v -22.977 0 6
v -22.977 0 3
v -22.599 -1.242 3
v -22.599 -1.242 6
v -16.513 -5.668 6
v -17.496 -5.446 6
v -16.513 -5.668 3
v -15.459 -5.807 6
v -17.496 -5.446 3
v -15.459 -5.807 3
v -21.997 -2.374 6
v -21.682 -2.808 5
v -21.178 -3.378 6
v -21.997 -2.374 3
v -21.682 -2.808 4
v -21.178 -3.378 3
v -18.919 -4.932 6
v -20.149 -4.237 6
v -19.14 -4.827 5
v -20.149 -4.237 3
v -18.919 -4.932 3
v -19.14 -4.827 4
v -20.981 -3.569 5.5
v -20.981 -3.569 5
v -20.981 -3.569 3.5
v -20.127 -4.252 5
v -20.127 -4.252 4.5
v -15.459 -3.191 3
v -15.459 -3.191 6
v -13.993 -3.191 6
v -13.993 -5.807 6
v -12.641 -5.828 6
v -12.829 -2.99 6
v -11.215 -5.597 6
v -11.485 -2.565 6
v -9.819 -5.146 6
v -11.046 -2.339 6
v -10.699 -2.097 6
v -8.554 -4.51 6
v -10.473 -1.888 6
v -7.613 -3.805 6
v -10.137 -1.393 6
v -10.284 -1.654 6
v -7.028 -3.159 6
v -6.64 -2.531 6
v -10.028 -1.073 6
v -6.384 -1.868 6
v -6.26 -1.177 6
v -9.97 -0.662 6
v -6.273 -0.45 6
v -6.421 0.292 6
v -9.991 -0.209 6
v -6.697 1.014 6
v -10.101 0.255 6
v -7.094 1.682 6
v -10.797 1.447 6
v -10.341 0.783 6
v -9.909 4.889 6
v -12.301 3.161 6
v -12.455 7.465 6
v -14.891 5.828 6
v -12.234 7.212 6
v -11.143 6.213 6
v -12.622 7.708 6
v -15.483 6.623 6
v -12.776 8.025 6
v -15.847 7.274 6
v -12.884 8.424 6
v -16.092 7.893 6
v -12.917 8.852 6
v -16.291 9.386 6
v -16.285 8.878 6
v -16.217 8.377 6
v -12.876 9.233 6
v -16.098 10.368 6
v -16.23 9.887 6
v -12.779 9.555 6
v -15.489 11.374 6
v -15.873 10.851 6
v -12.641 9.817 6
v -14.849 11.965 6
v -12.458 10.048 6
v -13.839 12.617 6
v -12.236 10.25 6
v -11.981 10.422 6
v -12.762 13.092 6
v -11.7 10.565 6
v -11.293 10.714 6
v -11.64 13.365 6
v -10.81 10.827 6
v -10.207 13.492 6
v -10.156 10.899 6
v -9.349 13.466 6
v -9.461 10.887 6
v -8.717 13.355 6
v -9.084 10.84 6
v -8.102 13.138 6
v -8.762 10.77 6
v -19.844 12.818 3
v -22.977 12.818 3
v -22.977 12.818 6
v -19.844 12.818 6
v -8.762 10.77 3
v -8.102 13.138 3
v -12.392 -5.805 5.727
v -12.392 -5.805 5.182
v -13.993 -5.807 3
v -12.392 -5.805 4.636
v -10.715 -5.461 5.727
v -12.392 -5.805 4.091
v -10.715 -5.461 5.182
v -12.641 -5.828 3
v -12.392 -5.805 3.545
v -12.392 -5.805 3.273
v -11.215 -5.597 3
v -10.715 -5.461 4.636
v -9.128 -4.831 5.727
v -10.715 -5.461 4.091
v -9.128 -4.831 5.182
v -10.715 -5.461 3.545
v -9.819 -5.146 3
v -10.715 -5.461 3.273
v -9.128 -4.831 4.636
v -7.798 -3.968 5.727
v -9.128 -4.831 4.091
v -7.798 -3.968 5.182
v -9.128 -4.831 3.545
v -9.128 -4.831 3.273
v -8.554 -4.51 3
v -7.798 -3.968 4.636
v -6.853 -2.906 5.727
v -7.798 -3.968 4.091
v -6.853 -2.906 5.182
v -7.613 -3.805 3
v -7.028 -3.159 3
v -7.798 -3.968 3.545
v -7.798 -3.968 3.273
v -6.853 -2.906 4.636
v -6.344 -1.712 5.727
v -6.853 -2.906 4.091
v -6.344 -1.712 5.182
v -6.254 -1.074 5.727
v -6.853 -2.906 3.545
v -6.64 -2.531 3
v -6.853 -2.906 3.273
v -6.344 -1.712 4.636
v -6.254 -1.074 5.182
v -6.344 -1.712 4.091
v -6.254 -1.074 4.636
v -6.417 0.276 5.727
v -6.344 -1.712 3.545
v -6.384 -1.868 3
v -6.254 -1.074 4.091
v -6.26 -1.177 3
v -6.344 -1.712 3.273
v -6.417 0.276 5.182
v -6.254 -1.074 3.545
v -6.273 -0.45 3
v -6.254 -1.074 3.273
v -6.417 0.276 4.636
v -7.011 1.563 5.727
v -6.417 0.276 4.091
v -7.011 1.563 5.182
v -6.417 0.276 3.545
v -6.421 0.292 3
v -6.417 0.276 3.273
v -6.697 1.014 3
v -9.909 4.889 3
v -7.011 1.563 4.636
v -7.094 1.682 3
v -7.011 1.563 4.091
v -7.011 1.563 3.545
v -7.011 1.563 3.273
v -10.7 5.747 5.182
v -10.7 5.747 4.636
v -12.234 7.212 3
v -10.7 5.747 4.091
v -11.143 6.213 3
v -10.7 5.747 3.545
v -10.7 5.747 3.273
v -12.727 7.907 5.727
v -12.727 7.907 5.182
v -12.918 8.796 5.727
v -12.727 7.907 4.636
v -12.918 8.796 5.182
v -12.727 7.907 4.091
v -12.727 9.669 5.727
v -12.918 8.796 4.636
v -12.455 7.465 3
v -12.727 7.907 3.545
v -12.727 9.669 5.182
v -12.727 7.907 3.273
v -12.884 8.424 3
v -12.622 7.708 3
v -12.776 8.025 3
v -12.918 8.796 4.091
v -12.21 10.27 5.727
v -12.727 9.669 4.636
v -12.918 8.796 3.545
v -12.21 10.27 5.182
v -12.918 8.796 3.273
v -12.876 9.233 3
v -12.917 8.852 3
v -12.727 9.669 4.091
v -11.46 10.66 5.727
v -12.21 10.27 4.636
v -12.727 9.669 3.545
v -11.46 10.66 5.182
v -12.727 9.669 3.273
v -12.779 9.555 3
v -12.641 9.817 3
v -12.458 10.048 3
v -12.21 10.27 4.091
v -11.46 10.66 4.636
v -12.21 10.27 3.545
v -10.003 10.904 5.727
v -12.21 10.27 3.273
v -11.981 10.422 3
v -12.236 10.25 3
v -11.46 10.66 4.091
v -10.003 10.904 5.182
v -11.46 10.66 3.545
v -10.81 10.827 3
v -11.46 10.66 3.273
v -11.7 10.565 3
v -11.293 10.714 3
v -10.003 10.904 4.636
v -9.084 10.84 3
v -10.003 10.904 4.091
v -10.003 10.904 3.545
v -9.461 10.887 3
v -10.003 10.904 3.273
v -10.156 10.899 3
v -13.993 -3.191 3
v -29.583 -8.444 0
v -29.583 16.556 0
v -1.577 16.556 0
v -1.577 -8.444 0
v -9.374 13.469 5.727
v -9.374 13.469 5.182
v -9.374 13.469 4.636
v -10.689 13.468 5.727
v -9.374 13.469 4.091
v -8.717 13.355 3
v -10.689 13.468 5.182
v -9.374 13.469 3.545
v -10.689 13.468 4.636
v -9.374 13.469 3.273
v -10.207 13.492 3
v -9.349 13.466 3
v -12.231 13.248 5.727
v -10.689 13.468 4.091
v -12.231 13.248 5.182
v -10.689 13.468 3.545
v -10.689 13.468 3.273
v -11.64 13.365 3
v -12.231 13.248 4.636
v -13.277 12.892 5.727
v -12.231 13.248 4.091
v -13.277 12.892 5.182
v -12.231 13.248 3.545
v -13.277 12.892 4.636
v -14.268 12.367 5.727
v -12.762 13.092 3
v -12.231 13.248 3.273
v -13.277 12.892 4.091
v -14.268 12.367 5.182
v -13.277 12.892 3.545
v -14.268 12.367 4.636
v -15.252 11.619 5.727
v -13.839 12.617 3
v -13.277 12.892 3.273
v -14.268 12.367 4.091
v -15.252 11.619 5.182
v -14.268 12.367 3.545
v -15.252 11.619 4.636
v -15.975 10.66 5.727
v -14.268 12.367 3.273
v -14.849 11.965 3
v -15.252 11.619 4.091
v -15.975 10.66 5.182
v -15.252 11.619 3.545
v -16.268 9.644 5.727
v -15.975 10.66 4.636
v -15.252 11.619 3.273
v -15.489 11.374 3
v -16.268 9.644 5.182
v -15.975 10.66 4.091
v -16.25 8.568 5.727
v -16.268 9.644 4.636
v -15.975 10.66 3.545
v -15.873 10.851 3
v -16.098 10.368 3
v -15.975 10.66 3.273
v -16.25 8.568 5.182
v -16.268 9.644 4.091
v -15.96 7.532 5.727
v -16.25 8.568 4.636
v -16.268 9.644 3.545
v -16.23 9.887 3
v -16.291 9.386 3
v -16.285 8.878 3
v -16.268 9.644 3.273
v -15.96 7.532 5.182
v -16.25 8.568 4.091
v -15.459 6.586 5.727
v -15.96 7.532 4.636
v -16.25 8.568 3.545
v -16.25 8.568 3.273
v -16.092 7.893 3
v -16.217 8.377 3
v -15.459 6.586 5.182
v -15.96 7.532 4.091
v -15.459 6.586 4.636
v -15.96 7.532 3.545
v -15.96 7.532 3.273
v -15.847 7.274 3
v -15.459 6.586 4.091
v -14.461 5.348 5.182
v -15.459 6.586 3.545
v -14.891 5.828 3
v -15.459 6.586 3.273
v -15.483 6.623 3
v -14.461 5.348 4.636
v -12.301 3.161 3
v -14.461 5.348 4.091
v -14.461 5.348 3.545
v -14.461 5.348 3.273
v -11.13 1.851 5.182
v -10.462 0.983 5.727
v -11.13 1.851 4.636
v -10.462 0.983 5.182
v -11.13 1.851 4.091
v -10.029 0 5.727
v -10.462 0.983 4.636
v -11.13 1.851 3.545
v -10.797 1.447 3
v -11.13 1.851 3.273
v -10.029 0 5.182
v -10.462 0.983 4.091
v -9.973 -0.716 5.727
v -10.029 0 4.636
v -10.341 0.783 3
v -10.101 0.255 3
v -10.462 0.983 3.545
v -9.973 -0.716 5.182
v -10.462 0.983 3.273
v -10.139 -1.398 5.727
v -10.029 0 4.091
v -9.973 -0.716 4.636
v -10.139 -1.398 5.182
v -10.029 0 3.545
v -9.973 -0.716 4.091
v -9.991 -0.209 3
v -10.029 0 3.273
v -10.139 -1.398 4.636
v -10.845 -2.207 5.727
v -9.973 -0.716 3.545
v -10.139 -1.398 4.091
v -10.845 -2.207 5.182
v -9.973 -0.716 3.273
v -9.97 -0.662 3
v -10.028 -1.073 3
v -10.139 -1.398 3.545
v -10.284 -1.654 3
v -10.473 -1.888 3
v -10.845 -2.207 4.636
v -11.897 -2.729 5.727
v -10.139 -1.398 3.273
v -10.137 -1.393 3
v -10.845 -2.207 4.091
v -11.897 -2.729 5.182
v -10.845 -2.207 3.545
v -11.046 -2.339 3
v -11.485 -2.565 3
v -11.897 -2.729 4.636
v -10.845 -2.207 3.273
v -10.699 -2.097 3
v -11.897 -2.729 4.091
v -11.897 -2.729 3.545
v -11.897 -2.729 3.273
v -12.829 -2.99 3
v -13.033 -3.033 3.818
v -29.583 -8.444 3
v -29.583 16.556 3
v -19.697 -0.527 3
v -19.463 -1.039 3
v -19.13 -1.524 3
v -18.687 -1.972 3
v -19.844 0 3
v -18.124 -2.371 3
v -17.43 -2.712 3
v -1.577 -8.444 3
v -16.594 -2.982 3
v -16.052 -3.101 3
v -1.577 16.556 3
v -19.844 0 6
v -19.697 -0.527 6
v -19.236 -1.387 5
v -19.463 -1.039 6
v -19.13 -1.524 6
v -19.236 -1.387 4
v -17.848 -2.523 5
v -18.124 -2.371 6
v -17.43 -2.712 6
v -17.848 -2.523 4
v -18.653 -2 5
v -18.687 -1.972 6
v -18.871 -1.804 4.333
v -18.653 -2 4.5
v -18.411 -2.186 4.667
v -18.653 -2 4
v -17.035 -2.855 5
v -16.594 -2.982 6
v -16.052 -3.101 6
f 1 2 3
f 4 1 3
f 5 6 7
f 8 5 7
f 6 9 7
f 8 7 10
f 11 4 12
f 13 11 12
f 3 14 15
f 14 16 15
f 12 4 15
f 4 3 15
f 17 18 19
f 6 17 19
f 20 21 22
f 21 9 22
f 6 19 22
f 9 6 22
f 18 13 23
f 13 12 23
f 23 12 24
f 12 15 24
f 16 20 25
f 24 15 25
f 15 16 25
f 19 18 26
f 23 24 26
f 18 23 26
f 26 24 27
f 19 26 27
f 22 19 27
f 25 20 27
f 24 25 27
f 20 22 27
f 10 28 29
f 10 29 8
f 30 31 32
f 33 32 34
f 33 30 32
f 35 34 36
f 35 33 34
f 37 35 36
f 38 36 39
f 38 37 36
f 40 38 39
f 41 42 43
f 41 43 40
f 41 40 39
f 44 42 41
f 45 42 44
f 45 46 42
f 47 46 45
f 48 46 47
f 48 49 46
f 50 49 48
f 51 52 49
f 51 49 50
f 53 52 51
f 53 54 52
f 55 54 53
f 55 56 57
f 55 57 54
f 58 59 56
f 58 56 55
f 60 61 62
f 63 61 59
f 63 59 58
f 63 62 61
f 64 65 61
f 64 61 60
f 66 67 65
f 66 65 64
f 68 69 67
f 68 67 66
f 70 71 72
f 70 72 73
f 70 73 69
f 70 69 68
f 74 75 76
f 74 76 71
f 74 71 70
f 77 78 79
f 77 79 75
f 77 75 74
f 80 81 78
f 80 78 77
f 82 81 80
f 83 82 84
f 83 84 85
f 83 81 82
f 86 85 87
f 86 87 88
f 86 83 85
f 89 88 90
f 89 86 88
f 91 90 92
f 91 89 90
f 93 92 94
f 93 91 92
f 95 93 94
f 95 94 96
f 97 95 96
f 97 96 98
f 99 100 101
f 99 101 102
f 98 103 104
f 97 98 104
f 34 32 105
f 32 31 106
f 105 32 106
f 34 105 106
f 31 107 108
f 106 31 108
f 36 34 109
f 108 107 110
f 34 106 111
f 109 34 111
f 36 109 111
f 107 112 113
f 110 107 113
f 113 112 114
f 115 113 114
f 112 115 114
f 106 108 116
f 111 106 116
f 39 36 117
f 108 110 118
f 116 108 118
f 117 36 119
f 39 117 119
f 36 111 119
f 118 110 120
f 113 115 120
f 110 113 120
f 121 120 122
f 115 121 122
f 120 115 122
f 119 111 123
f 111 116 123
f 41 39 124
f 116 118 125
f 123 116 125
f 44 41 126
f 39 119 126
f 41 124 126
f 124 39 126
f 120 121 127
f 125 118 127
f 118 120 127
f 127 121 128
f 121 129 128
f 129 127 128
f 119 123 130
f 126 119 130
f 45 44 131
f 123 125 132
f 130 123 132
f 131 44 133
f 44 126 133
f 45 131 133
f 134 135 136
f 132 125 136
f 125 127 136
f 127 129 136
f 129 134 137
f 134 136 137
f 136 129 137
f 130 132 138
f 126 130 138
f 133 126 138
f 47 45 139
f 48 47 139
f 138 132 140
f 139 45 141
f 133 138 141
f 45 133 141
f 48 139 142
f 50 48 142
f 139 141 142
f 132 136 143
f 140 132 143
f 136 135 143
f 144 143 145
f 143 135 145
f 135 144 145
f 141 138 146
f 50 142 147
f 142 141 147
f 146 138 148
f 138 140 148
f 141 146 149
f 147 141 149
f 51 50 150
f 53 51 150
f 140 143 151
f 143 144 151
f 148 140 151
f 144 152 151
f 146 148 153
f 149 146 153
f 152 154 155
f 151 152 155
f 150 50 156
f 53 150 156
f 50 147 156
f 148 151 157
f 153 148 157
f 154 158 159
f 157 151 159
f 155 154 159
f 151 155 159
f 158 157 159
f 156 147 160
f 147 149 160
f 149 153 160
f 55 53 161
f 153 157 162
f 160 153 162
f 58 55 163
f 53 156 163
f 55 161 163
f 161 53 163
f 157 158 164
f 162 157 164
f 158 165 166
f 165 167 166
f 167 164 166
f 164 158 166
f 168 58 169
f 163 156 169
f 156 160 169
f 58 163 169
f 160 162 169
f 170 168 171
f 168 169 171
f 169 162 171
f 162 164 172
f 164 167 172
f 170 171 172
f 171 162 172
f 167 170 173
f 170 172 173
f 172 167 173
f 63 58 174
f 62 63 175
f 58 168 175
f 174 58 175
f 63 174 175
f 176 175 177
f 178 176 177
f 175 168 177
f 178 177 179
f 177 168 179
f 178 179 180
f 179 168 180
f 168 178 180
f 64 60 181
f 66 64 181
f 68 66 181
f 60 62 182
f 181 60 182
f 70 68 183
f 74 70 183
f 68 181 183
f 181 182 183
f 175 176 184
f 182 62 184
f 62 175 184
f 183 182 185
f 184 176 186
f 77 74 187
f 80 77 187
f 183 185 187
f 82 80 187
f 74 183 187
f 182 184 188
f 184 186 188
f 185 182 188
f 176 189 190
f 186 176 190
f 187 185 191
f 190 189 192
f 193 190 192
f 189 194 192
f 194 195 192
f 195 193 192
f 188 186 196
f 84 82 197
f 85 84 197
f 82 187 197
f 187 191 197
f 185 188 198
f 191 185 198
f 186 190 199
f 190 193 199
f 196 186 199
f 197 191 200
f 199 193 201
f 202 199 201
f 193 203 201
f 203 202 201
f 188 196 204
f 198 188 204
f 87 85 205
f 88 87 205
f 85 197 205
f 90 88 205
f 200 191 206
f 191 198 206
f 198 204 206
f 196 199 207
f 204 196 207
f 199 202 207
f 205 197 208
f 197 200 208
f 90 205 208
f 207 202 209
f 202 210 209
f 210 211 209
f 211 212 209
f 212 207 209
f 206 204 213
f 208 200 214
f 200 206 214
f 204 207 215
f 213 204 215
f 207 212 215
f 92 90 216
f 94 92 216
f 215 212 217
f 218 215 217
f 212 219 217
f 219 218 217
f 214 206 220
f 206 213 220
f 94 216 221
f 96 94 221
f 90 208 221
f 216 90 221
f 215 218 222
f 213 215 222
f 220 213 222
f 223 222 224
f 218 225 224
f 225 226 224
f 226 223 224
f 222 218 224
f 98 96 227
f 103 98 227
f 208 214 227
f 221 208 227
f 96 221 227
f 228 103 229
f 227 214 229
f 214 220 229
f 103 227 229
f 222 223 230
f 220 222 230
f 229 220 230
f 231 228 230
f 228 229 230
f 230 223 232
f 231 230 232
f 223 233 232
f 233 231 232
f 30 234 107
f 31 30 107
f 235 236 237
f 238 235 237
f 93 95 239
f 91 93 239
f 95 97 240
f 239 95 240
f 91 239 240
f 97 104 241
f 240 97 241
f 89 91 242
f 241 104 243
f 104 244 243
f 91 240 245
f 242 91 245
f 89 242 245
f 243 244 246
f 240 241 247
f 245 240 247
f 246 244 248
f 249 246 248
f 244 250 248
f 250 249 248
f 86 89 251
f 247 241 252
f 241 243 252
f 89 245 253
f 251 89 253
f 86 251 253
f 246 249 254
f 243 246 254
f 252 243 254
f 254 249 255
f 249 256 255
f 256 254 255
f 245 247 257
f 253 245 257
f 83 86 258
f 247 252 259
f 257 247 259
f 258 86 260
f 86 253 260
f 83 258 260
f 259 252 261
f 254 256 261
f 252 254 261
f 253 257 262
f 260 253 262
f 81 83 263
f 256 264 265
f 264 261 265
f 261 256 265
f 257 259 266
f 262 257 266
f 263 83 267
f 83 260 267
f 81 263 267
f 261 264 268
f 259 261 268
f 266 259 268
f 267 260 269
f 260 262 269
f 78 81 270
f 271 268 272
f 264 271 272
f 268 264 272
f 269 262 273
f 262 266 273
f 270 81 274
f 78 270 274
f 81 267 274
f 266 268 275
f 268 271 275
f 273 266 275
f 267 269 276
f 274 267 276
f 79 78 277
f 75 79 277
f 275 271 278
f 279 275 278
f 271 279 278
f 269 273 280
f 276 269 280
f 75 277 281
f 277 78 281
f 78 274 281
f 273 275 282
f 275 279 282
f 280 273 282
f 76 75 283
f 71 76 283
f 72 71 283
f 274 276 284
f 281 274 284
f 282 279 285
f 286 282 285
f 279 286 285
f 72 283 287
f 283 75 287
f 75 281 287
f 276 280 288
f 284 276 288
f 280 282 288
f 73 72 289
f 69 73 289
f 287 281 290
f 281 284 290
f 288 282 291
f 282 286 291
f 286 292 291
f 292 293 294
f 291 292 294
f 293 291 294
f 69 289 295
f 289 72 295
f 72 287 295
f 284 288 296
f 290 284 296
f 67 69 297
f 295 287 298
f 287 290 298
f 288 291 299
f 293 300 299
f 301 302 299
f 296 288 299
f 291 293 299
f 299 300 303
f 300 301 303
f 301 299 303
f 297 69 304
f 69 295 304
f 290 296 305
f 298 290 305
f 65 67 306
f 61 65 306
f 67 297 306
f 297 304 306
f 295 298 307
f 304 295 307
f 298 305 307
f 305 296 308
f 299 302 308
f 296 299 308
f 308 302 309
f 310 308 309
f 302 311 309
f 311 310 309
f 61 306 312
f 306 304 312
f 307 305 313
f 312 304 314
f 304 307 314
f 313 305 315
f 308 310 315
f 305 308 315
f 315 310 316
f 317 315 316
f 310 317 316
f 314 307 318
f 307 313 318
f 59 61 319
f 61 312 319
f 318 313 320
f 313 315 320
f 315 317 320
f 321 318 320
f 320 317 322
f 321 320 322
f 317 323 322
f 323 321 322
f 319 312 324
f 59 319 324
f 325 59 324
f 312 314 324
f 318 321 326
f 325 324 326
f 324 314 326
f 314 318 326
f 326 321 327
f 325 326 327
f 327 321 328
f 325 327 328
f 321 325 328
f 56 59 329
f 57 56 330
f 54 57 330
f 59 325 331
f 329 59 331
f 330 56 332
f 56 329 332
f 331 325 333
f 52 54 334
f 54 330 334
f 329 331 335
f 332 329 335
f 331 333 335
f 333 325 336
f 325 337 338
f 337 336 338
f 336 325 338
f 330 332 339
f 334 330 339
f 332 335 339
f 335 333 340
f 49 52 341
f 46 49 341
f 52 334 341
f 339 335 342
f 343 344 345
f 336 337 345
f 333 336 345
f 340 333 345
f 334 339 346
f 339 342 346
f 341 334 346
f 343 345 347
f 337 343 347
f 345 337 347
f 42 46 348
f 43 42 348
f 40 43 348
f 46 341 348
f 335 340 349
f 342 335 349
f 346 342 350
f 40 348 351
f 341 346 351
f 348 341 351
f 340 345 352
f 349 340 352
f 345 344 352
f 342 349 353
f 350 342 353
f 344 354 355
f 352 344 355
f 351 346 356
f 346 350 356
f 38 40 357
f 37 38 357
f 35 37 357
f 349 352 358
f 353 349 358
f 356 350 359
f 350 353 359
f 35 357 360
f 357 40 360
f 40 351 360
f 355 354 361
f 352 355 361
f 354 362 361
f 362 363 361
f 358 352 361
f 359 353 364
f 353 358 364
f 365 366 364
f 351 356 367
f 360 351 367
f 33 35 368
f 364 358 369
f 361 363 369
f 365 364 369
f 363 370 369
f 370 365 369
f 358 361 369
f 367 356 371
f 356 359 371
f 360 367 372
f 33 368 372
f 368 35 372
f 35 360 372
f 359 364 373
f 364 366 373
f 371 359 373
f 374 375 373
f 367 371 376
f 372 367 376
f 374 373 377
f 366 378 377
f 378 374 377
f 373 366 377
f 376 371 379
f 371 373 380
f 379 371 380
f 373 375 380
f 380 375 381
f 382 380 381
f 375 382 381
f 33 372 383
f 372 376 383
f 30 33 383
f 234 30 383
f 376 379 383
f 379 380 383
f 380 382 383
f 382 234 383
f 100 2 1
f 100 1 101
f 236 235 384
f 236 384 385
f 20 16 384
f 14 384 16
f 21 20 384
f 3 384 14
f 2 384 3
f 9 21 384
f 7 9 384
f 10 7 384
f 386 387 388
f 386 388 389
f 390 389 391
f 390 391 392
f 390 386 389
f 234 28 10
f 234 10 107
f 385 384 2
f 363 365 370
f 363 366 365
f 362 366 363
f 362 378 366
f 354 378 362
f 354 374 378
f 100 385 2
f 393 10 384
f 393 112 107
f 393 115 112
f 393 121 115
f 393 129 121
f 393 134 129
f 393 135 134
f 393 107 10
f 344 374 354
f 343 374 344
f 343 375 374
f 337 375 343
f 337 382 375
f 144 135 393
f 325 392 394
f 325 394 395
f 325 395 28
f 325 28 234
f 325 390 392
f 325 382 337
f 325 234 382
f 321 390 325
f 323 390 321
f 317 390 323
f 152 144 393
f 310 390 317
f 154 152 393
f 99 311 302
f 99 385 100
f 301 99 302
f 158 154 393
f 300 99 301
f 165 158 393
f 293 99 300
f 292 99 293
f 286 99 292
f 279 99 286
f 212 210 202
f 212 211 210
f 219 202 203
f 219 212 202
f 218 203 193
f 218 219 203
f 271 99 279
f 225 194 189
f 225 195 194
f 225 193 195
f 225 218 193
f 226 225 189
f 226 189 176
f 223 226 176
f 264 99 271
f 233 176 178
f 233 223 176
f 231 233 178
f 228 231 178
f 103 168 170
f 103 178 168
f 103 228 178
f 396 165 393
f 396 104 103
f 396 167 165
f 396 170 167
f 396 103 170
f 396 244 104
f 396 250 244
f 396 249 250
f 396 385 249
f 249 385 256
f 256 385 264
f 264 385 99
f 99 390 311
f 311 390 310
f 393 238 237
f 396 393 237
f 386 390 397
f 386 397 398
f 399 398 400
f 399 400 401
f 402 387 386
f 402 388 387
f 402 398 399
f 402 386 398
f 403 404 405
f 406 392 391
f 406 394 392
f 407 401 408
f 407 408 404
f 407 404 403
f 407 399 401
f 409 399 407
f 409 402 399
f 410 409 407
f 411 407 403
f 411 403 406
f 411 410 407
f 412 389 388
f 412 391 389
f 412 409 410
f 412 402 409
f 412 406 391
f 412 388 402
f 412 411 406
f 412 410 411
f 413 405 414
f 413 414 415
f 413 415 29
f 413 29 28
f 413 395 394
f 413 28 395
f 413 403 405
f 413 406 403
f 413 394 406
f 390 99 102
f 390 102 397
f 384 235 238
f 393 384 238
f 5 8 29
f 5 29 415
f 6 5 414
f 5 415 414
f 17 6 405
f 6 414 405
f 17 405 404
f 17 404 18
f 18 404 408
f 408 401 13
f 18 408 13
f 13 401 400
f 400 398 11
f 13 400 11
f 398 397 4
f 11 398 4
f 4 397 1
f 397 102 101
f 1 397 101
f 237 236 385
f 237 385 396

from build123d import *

# Parameters (mm, degrees)
ESBO_O2_W                = 28.005258982
ESBO_O2_H                = 25
RESSALTO_EXTRUS_O2_DEPTH = 3
RESSALTO_EXTRUS_O3_DEPTH = 3


with BuildPart() as part:
    # Esboço2 → Ressalto-extrusão2 (new body)
    with BuildSketch(Plane.XY):
        with Locations((-15.580063099, 4.056140734)):
            Rectangle(ESBO_O2_W, ESBO_O2_H)
    extrude(amount=RESSALTO_EXTRUS_O2_DEPTH)

    # Esboço3 → Ressalto-extrusão3 (add)
    with BuildSketch(Plane.XY.offset(3)):
        with BuildLine():
            Line((-22.976519513, 12.817773551), (-19.844322365, 12.817773551))
            Line((-19.844322365, 12.817773551), (-19.844322365, 0))
            add(Edge.make_bspline(
                [(-19.844322365, 0), (-19.554313615, -1.441237844), (-18.419895336, -2.82839401), (-15.459246358, -3.191234096)],
                knots=[0, 0, 0, 0, 1, 1, 1, 1], degree=3))
            Line((-15.459246358, -3.191234096), (-15.459246358, -5.807322462))
            add(Edge.make_bspline(
                [(-22.976519513, 0), (-22.342950164, -3.119426977), (-19.67287852, -5.430233831), (-15.459246358, -5.807322462)],
                knots=[0, 0, 0, 0, 1, 1, 1, 1], degree=3))
            Line((-22.976519513, 0), (-22.976519513, 12.817773551))
        make_face()
        with BuildLine():
            Line((-8.762433428, 10.770060548), (-8.101727847, 13.137588881))
            add(Edge.make_bspline(
                [(-8.101727847, 13.137588881), (-8.924828337, 13.518932368), (-10.333657048, 13.534512796), (-12.469375349, 13.284688146), (-14.364277192, 12.437834174), (-16.197035001, 10.895965746), (-16.432904829, 8.512188949), (-15.410291344, 6.185562517), (-13.280851196, 4.221657715), (-11.357184283, 2.170384327), (-9.886476679, 0.33084215), (-10.023236057, -2.58947903), (-12.947523124, -3.046355907), (-13.99301928, -3.191234096)],
                knots=[0, 0, 0, 0, 0.095975185, 0.15280172, 0.233791993, 0.321873122, 0.398877795, 0.476755317, 0.592890403, 0.710882462, 0.789460509, 0.840629791, 1, 1, 1, 1], degree=3))
            Line((-13.99301928, -3.191234096), (-13.99301928, -5.807322462))
            add(Edge.make_bspline(
                [(-13.99301928, -5.807322462), (-11.983965985, -6.054331018), (-7.975626402, -4.843183812), (-6.416925621, -2.346264854), (-6.141862445, -0.442680707), (-6.5783755, 1.124619896), (-8.611866991, 3.478772031), (-9.737509425, 4.707569013), (-11.556652455, 6.673428344), (-12.951560908, 7.609819126), (-13.006485815, 9.789530222), (-11.213319319, 11.008148273), (-9.397889759, 10.947397199), (-8.762433428, 10.770060548)],
                knots=[0, 0, 0, 0, 0.199547373, 0.300843585, 0.326269257, 0.428378424, 0.465295504, 0.658522973, 0.691498049, 0.770892829, 0.837392887, 0.898086999, 1, 1, 1, 1], degree=3))
        make_face()
    extrude(amount=RESSALTO_EXTRUS_O3_DEPTH)


solid = part.part
